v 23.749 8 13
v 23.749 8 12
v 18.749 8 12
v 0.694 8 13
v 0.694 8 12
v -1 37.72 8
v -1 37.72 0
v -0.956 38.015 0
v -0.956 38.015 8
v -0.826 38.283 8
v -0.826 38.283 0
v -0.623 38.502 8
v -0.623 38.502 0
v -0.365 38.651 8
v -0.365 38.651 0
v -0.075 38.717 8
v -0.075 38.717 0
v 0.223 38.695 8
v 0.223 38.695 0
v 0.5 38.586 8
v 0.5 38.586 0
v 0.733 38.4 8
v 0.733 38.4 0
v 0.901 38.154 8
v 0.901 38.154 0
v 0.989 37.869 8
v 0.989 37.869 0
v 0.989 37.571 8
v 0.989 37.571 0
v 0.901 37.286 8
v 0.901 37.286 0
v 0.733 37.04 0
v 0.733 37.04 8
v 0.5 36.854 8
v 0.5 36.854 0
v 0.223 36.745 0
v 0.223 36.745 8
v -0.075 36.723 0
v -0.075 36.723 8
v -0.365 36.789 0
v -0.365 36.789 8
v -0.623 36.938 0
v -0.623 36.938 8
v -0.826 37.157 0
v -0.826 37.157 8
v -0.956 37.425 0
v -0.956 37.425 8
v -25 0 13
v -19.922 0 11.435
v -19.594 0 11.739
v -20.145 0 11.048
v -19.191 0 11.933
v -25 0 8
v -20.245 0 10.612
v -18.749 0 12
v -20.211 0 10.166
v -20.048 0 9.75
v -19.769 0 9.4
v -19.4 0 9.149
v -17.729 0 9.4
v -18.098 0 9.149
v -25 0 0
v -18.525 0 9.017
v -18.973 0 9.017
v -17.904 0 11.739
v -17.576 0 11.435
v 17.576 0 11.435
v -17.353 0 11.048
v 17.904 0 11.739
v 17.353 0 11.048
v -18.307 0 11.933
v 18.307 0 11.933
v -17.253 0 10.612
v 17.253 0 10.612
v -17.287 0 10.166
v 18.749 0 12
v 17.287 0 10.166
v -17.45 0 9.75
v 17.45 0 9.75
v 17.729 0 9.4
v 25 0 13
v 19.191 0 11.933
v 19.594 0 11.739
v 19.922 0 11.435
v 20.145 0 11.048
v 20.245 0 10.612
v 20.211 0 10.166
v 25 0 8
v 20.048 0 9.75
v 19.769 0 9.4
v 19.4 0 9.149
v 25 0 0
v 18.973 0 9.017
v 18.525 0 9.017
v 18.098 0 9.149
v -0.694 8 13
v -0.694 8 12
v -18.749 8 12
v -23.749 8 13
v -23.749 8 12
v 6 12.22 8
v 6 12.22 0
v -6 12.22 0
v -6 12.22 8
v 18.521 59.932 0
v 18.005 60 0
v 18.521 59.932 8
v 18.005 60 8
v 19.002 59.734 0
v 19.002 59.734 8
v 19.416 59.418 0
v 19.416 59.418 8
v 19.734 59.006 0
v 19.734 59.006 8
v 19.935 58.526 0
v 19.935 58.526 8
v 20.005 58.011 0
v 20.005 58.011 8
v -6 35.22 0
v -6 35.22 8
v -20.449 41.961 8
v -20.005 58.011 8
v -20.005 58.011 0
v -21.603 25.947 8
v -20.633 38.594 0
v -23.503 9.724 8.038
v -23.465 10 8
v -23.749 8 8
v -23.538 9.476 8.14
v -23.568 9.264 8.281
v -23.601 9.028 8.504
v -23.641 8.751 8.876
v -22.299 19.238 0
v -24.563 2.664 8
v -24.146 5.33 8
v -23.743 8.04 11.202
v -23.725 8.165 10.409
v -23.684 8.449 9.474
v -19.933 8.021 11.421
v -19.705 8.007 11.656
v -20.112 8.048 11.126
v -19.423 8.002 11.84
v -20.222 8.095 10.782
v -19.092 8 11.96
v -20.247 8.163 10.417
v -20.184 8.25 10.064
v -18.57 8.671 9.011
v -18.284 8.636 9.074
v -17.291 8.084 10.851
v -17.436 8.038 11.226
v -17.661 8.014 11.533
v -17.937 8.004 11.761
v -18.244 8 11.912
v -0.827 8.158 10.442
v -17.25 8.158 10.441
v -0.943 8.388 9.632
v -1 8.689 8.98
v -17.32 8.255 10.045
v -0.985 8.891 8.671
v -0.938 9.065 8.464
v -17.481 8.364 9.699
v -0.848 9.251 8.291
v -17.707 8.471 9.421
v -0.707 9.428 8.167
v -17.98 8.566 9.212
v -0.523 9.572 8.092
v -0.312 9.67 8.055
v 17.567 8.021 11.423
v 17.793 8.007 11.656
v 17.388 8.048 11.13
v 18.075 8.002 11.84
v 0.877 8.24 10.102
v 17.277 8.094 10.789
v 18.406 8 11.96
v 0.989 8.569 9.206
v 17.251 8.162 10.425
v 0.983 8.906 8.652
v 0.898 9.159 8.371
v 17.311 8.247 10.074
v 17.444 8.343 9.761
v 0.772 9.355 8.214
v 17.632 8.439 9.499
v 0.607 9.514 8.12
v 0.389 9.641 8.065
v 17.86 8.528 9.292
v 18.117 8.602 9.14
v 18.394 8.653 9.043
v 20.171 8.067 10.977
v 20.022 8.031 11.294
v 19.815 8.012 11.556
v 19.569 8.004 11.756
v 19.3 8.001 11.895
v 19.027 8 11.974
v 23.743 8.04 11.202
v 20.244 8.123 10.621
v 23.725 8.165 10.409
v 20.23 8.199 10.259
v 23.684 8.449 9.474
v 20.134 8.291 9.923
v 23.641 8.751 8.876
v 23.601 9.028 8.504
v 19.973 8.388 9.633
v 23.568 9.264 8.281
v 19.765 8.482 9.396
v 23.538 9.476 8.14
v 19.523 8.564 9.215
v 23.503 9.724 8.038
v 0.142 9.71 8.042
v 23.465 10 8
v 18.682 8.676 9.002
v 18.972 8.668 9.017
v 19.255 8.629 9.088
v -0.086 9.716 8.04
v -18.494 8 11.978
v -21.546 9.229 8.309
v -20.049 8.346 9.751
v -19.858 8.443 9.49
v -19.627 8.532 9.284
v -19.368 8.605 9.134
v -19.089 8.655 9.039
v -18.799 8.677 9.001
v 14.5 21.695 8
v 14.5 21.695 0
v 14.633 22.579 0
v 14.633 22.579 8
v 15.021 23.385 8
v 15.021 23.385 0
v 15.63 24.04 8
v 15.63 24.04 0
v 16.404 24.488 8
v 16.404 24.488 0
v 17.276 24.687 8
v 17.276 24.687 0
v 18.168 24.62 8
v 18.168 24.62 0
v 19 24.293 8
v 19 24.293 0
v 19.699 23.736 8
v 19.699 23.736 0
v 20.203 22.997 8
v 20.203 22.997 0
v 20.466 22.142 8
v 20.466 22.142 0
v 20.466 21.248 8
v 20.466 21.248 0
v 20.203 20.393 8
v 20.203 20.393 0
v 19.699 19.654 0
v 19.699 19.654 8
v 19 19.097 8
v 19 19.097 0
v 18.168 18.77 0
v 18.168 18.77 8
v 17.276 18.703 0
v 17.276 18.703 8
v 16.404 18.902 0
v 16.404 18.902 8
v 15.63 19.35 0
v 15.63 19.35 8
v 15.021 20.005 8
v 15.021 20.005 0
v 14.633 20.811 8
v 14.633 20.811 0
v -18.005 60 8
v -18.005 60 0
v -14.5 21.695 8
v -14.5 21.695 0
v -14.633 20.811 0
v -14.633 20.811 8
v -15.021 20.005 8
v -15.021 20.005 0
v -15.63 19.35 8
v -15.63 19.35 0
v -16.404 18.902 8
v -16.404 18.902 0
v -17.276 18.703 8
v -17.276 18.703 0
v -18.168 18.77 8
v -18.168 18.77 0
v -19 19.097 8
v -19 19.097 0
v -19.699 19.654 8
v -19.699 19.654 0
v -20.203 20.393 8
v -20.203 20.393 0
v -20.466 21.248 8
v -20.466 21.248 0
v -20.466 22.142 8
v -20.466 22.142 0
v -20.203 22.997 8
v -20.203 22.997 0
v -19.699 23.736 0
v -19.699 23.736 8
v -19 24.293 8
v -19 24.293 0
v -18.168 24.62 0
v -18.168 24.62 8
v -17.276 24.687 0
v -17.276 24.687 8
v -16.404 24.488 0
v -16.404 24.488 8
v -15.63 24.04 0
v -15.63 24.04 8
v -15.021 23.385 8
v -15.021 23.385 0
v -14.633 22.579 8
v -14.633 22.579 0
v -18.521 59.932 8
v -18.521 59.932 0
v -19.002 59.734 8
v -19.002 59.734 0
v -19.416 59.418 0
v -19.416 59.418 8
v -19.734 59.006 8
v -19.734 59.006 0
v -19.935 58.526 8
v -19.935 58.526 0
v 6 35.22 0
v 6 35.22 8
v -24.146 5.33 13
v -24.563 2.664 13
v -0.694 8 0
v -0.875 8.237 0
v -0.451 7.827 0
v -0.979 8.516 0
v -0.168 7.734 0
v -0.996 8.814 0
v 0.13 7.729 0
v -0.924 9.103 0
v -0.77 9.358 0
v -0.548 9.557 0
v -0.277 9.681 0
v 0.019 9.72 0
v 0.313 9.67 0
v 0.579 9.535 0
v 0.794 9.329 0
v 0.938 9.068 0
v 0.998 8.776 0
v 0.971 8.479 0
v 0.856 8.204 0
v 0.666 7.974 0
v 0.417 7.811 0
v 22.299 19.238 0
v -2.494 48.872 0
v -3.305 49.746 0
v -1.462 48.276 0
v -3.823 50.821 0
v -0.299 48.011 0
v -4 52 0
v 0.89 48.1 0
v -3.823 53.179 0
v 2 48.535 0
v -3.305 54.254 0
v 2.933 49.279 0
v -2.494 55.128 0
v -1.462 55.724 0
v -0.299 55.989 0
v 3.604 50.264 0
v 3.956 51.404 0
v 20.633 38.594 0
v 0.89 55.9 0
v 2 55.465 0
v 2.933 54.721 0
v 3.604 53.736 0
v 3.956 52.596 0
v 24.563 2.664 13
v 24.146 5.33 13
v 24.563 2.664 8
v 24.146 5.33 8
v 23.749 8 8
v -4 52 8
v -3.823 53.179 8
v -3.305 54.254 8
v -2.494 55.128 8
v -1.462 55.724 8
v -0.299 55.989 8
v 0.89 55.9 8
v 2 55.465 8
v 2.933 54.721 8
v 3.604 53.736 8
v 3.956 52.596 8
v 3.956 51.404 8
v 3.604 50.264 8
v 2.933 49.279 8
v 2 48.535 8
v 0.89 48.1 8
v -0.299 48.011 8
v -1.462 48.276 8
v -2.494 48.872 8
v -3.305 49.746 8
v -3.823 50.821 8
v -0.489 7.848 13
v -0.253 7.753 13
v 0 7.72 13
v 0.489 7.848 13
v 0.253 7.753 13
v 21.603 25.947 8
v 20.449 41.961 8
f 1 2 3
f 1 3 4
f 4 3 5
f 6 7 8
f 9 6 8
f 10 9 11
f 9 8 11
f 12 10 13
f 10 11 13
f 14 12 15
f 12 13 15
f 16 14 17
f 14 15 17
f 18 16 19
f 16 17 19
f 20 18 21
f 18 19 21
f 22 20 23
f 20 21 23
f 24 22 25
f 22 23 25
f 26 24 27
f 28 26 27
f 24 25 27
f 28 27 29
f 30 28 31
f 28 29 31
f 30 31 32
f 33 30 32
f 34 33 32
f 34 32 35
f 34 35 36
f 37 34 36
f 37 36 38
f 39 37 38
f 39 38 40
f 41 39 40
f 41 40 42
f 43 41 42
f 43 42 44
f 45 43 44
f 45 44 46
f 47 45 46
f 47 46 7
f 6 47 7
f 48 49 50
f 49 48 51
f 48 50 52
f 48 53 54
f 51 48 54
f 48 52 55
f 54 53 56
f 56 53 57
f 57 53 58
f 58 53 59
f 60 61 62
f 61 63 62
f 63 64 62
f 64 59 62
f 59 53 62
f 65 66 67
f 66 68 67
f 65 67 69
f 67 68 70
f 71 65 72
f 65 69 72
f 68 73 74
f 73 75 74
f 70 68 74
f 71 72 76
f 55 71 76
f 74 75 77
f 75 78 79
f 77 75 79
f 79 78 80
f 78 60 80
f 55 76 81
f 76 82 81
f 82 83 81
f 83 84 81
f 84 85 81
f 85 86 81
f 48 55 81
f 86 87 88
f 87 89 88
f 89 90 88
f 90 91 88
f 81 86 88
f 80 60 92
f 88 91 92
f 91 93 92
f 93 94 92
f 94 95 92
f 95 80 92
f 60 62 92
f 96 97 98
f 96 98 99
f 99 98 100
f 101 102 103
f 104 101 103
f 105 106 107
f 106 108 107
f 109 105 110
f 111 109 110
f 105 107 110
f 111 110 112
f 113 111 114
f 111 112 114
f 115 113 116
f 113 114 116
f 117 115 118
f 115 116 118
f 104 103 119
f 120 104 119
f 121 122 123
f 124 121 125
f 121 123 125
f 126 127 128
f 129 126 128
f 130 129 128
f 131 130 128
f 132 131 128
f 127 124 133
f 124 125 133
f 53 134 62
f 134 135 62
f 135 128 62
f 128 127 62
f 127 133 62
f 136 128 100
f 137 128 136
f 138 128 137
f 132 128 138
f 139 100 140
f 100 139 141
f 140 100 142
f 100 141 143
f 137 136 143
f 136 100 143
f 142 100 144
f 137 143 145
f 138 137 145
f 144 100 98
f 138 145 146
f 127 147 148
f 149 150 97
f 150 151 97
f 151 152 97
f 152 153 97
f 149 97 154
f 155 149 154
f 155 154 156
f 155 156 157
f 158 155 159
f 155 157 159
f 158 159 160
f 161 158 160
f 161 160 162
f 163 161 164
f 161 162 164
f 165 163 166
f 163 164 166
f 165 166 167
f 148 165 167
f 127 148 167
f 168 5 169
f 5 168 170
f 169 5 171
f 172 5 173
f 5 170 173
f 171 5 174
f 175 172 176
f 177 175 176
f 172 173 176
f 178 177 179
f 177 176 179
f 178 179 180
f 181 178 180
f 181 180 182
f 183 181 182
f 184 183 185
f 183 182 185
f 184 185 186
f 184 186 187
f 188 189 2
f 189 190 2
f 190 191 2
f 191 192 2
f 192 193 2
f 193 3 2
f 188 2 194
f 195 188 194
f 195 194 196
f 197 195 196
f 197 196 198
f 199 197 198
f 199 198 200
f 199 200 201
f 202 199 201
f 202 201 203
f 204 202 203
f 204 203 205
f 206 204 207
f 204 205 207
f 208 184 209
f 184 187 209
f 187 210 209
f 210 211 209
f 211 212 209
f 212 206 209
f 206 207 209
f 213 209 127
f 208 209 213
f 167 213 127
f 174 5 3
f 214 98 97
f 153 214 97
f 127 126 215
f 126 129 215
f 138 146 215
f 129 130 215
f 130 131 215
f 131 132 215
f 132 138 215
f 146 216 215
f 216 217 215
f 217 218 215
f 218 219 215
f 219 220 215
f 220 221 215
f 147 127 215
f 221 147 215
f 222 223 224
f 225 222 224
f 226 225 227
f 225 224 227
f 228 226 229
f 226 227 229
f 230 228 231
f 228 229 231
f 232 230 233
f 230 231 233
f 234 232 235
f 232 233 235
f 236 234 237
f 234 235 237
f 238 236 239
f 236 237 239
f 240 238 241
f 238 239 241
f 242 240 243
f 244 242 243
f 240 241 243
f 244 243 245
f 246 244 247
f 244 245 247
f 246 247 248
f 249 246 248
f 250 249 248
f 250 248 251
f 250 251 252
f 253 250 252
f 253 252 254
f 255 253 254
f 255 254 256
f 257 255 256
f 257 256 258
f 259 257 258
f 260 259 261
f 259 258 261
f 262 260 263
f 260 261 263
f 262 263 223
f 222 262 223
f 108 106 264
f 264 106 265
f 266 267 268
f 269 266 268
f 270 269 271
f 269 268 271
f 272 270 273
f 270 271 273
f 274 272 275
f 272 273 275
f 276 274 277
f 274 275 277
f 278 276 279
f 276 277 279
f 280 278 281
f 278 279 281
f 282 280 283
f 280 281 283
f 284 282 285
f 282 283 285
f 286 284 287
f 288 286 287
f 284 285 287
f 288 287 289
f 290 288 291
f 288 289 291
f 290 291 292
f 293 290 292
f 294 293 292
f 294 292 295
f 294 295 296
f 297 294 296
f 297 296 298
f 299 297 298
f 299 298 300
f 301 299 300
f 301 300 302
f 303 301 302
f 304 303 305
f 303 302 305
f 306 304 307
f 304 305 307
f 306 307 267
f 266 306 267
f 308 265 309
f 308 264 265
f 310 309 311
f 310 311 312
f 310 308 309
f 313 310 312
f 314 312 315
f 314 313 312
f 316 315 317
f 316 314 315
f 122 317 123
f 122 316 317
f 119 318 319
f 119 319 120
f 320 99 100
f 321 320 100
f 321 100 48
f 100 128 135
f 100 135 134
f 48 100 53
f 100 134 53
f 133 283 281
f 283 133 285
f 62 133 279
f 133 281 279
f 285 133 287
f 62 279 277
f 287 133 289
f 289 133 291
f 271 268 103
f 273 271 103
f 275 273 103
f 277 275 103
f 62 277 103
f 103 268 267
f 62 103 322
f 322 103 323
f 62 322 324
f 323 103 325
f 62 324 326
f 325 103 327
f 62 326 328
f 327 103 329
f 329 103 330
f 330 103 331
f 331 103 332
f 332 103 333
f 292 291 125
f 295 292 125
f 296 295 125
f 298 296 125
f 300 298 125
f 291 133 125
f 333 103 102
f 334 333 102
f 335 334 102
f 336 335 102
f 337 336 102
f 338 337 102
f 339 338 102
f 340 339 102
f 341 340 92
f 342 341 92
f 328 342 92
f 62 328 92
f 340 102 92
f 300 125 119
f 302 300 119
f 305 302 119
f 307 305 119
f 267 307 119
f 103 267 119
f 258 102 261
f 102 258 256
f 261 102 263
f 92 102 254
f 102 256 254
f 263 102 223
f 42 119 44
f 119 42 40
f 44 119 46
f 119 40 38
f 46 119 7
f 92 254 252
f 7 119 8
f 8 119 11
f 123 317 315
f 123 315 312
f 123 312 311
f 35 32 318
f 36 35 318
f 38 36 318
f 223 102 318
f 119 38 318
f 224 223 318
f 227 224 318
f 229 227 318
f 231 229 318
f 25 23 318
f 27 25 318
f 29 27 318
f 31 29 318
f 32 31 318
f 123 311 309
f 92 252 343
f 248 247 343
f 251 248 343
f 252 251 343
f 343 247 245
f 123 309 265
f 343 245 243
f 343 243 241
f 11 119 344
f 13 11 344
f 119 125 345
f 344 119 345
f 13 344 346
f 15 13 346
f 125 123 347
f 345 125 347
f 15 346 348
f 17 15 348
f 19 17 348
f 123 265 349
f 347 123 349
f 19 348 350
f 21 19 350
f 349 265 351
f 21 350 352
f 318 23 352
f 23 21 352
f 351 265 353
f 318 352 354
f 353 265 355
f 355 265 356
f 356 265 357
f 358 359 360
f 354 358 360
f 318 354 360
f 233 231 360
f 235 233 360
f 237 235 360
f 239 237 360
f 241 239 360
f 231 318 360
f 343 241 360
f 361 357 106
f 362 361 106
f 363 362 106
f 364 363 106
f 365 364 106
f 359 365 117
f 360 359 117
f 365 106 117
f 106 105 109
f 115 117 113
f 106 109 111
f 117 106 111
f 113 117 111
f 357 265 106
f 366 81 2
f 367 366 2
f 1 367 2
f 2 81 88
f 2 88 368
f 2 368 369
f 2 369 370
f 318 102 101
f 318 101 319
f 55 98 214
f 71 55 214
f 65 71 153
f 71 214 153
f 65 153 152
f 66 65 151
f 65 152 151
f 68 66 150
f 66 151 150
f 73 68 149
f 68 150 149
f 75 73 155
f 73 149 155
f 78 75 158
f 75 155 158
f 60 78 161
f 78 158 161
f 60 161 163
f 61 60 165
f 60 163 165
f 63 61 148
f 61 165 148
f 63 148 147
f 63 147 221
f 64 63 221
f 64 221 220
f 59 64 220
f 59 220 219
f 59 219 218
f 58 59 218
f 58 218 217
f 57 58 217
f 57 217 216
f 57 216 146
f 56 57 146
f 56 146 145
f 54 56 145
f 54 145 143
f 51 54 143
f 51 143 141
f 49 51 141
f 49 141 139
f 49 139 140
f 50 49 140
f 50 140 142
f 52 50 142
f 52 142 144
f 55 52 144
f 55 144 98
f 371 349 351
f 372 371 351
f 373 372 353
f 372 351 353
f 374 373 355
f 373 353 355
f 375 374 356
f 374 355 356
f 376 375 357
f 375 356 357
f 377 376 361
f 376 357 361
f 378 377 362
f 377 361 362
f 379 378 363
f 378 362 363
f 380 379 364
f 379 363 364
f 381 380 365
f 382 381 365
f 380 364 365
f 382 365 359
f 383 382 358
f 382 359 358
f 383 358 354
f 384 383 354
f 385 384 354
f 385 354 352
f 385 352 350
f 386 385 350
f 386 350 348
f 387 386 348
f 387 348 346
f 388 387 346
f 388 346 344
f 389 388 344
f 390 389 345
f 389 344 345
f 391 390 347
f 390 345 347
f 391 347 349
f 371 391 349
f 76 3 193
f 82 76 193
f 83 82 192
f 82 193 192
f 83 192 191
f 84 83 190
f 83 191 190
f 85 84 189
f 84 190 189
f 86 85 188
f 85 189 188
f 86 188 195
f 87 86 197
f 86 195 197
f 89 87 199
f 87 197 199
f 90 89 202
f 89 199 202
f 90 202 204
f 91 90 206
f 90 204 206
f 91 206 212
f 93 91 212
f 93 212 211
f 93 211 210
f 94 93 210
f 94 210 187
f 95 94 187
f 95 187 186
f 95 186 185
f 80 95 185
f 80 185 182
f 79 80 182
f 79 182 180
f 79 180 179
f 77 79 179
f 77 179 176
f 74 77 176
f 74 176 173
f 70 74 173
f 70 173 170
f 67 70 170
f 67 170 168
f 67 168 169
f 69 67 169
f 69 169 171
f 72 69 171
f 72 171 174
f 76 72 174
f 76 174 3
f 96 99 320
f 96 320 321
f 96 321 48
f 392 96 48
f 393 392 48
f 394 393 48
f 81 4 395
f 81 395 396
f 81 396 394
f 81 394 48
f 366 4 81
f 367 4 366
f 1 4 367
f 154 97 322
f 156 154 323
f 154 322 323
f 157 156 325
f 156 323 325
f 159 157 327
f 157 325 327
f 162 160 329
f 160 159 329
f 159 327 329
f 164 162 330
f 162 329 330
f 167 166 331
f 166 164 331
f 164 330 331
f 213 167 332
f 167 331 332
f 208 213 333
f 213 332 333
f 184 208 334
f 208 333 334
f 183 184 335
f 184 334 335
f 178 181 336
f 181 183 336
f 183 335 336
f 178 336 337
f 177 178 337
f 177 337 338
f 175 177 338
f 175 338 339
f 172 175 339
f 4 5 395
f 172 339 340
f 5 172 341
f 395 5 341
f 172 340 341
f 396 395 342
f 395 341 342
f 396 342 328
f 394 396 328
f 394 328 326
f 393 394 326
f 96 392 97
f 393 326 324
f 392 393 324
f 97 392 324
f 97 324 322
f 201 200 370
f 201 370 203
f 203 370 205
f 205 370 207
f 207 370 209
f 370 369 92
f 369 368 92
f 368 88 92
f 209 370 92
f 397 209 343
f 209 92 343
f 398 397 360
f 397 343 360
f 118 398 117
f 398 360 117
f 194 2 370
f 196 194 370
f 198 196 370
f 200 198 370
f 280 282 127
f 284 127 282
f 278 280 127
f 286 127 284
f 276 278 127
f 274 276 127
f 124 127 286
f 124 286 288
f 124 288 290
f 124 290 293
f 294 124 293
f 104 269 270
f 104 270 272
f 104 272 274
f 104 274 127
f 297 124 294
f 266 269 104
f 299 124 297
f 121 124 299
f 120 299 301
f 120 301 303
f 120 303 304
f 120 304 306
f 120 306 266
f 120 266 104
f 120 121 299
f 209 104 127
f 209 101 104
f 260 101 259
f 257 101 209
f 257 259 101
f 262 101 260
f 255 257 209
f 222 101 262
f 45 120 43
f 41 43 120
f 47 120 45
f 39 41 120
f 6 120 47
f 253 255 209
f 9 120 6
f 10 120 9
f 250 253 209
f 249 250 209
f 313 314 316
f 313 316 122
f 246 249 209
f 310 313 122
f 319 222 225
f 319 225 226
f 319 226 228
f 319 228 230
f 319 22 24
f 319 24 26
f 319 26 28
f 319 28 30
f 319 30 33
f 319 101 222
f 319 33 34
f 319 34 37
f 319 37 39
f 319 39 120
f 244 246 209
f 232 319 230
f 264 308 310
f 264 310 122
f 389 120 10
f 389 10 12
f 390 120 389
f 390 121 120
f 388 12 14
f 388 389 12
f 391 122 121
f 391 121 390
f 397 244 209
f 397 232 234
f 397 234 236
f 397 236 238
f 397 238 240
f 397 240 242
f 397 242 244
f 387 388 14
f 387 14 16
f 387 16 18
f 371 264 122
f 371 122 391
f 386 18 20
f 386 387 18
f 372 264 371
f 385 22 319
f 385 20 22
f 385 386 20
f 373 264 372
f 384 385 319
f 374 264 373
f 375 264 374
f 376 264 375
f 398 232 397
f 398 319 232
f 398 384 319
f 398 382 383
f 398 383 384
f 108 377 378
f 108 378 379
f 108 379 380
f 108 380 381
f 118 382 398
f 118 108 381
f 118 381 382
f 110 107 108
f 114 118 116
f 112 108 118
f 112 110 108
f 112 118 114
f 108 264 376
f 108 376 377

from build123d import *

# Parameters (mm, degrees)
BOSS_EXTRUDE1_DEPTH  = 8
BOSS_EXTRUDE2_DEPTH  = 5
SKETCH3_R            = 1.5
CUT_EXTRUDE_DEPTH    = 8
FILLET1_SIZE         = 4
FILLET1_SIZE_2       = 2
FILLET2_R            = 2
SKETCH4_R            = 4.0005
SKETCH4_R_2          = 4.725
SKETCH4_R_3          = 3
M4_H6_T_INSERT_DEPTH = 8
SKETCH12_R           = 1
SKETCH12_W           = 12
SKETCH12_H           = 23
CUT_EXTRUDE1_DEPTH   = 67.287253734


with BuildPart() as part:
    # Sketch1 → Boss-Extrude1 (new body)
    with BuildSketch(Plane.XY):
        with BuildLine():
            Line((20, 60), (-20, 60))
            ThreePointArc((-20, 60), (-21.252162636, 29.896013553), (-25, 0))
            Line((-25, 0), (25, 0))
            ThreePointArc((25, 0), (21.252162636, 29.896013553), (20, 60))
        make_face()
    extrude(amount=BOSS_EXTRUDE1_DEPTH)

    # Sketch2 → Boss-Extrude2 (add)
    with BuildSketch(Plane.XY.offset(8)):
        with BuildLine():
            Line((-25, 0), (25, 0))
            ThreePointArc((25, 0), (24.352183064, 3.996507037), (23.749041813, 8))
            Line((23.749041813, 8), (-23.749041813, 8))
            ThreePointArc((-23.749041813, 8), (-24.352183064, 3.996507037), (-25, 0))
        make_face()
    extrude(amount=BOSS_EXTRUDE2_DEPTH)

    # Sketch3 → Cut-Extrude (cut)
    with BuildSketch(Plane(origin=(0, 8, 0), x_dir=(1, 0, 0), z_dir=(0, 1, 0))):
        with Locations(Location((-18.749041813, -10.5, 0), (0, 0, 270))):
            Circle(SKETCH3_R)
        with Locations(Location((18.749041813, -10.5, 0), (0, 0, 270))):
            Circle(SKETCH3_R)
    extrude(amount=-CUT_EXTRUDE_DEPTH, mode=Mode.SUBTRACT)

    # Fillet1
    # an asymmetric fillet: 4, 2 mm, written as the material it adds along each edge
    with BuildSketch(Plane(origin=(33.749041813, 8, 8), x_dir=(0, 0, 1), z_dir=(-1, 0, 0))) as fillet1_piece_1_section:
        with BuildLine():
            Bezier((FILLET1_SIZE, 0), (0, 0), (0, FILLET1_SIZE_2), weights=[1, 0.707106781, 1])
            Line((0, FILLET1_SIZE_2), (-0.08, 2))
            Line((-0.08, 2), (-0.08, -0.08))
            Line((-0.08, -0.08), (4, -0.08))
            Line((4, -0.08), (FILLET1_SIZE, 0))
        make_face()
    fillet1_piece_1 = extrude(amount=67.498083626, mode=Mode.PRIVATE)
    fillet1_piece_1 = fillet1_piece_1 - Plane(origin=(382.5, 60, 8.944071766), x_dir=(-0.9862068965517241, -0.1655172413793104, 0), z_dir=(0, 0, -1)) * Cylinder(362.5, 151, mode=Mode.PRIVATE)
    fillet1_piece_1 = fillet1_piece_1 - Plane(origin=(-382.5, 60, 8.944071766), x_dir=(1, 0, 0), z_dir=(0, 0, -1)) * Cylinder(362.5, 151, mode=Mode.PRIVATE)
    fillet1_piece_1 = fillet1_piece_1 - Plane(origin=(-18.749041813, 8.425382089, 10.5), x_dir=(0, 0, 1), z_dir=(0, 1, 0)) * Cylinder(1.5, 151, mode=Mode.PRIVATE)
    fillet1_piece_1 = fillet1_piece_1 - Plane(origin=(18.749041813, 8.425382089, 10.5), x_dir=(0, 0, 1), z_dir=(0, 1, 0)) * Cylinder(1.5, 151, mode=Mode.PRIVATE)
    add(fillet1_piece_1)

    # Fillet2
    fillet2_edges = [part.edges().sort_by_distance(p)[0] for p in [
        (20, 60, 4),
        (-20, 60, 4),
    ]]
    fillet(fillet2_edges, radius=FILLET2_R)

    # Sketch4 → M4*H6 T-Insert (cut)
    with BuildSketch(Plane(origin=(0, 0, 0), x_dir=(-1, 0, 0), z_dir=(0, 0, -1))):
        with Locations((0, 52)):
            Circle(SKETCH4_R)
        with Locations((0, 29.37)):
            Circle(SKETCH4_R_2)
        with Locations((-17.5, 21.695)):
            Circle(SKETCH4_R_3)
        with Locations(Location((17.5, 21.695, 0), (0, 0, 180))):
            Circle(SKETCH4_R_3)
    extrude(amount=-M4_H6_T_INSERT_DEPTH, mode=Mode.SUBTRACT)

    # Sketch12 → Cut-Extrude1 (cut, through all)
    with BuildSketch(Plane(origin=(0, 0, 0), x_dir=(-1, 0, 0), z_dir=(0, 0, -1))):
        with Locations((0, 37.72)):
            Circle(SKETCH12_R)
        with Locations(Location((0, 8.72, 0), (0, 0, 313.945519562))):
            Circle(SKETCH12_R)
        with Locations((0, 23.72)):
            Rectangle(SKETCH12_W, SKETCH12_H)
    extrude(amount=-CUT_EXTRUDE1_DEPTH, mode=Mode.SUBTRACT)


solid = part.part
